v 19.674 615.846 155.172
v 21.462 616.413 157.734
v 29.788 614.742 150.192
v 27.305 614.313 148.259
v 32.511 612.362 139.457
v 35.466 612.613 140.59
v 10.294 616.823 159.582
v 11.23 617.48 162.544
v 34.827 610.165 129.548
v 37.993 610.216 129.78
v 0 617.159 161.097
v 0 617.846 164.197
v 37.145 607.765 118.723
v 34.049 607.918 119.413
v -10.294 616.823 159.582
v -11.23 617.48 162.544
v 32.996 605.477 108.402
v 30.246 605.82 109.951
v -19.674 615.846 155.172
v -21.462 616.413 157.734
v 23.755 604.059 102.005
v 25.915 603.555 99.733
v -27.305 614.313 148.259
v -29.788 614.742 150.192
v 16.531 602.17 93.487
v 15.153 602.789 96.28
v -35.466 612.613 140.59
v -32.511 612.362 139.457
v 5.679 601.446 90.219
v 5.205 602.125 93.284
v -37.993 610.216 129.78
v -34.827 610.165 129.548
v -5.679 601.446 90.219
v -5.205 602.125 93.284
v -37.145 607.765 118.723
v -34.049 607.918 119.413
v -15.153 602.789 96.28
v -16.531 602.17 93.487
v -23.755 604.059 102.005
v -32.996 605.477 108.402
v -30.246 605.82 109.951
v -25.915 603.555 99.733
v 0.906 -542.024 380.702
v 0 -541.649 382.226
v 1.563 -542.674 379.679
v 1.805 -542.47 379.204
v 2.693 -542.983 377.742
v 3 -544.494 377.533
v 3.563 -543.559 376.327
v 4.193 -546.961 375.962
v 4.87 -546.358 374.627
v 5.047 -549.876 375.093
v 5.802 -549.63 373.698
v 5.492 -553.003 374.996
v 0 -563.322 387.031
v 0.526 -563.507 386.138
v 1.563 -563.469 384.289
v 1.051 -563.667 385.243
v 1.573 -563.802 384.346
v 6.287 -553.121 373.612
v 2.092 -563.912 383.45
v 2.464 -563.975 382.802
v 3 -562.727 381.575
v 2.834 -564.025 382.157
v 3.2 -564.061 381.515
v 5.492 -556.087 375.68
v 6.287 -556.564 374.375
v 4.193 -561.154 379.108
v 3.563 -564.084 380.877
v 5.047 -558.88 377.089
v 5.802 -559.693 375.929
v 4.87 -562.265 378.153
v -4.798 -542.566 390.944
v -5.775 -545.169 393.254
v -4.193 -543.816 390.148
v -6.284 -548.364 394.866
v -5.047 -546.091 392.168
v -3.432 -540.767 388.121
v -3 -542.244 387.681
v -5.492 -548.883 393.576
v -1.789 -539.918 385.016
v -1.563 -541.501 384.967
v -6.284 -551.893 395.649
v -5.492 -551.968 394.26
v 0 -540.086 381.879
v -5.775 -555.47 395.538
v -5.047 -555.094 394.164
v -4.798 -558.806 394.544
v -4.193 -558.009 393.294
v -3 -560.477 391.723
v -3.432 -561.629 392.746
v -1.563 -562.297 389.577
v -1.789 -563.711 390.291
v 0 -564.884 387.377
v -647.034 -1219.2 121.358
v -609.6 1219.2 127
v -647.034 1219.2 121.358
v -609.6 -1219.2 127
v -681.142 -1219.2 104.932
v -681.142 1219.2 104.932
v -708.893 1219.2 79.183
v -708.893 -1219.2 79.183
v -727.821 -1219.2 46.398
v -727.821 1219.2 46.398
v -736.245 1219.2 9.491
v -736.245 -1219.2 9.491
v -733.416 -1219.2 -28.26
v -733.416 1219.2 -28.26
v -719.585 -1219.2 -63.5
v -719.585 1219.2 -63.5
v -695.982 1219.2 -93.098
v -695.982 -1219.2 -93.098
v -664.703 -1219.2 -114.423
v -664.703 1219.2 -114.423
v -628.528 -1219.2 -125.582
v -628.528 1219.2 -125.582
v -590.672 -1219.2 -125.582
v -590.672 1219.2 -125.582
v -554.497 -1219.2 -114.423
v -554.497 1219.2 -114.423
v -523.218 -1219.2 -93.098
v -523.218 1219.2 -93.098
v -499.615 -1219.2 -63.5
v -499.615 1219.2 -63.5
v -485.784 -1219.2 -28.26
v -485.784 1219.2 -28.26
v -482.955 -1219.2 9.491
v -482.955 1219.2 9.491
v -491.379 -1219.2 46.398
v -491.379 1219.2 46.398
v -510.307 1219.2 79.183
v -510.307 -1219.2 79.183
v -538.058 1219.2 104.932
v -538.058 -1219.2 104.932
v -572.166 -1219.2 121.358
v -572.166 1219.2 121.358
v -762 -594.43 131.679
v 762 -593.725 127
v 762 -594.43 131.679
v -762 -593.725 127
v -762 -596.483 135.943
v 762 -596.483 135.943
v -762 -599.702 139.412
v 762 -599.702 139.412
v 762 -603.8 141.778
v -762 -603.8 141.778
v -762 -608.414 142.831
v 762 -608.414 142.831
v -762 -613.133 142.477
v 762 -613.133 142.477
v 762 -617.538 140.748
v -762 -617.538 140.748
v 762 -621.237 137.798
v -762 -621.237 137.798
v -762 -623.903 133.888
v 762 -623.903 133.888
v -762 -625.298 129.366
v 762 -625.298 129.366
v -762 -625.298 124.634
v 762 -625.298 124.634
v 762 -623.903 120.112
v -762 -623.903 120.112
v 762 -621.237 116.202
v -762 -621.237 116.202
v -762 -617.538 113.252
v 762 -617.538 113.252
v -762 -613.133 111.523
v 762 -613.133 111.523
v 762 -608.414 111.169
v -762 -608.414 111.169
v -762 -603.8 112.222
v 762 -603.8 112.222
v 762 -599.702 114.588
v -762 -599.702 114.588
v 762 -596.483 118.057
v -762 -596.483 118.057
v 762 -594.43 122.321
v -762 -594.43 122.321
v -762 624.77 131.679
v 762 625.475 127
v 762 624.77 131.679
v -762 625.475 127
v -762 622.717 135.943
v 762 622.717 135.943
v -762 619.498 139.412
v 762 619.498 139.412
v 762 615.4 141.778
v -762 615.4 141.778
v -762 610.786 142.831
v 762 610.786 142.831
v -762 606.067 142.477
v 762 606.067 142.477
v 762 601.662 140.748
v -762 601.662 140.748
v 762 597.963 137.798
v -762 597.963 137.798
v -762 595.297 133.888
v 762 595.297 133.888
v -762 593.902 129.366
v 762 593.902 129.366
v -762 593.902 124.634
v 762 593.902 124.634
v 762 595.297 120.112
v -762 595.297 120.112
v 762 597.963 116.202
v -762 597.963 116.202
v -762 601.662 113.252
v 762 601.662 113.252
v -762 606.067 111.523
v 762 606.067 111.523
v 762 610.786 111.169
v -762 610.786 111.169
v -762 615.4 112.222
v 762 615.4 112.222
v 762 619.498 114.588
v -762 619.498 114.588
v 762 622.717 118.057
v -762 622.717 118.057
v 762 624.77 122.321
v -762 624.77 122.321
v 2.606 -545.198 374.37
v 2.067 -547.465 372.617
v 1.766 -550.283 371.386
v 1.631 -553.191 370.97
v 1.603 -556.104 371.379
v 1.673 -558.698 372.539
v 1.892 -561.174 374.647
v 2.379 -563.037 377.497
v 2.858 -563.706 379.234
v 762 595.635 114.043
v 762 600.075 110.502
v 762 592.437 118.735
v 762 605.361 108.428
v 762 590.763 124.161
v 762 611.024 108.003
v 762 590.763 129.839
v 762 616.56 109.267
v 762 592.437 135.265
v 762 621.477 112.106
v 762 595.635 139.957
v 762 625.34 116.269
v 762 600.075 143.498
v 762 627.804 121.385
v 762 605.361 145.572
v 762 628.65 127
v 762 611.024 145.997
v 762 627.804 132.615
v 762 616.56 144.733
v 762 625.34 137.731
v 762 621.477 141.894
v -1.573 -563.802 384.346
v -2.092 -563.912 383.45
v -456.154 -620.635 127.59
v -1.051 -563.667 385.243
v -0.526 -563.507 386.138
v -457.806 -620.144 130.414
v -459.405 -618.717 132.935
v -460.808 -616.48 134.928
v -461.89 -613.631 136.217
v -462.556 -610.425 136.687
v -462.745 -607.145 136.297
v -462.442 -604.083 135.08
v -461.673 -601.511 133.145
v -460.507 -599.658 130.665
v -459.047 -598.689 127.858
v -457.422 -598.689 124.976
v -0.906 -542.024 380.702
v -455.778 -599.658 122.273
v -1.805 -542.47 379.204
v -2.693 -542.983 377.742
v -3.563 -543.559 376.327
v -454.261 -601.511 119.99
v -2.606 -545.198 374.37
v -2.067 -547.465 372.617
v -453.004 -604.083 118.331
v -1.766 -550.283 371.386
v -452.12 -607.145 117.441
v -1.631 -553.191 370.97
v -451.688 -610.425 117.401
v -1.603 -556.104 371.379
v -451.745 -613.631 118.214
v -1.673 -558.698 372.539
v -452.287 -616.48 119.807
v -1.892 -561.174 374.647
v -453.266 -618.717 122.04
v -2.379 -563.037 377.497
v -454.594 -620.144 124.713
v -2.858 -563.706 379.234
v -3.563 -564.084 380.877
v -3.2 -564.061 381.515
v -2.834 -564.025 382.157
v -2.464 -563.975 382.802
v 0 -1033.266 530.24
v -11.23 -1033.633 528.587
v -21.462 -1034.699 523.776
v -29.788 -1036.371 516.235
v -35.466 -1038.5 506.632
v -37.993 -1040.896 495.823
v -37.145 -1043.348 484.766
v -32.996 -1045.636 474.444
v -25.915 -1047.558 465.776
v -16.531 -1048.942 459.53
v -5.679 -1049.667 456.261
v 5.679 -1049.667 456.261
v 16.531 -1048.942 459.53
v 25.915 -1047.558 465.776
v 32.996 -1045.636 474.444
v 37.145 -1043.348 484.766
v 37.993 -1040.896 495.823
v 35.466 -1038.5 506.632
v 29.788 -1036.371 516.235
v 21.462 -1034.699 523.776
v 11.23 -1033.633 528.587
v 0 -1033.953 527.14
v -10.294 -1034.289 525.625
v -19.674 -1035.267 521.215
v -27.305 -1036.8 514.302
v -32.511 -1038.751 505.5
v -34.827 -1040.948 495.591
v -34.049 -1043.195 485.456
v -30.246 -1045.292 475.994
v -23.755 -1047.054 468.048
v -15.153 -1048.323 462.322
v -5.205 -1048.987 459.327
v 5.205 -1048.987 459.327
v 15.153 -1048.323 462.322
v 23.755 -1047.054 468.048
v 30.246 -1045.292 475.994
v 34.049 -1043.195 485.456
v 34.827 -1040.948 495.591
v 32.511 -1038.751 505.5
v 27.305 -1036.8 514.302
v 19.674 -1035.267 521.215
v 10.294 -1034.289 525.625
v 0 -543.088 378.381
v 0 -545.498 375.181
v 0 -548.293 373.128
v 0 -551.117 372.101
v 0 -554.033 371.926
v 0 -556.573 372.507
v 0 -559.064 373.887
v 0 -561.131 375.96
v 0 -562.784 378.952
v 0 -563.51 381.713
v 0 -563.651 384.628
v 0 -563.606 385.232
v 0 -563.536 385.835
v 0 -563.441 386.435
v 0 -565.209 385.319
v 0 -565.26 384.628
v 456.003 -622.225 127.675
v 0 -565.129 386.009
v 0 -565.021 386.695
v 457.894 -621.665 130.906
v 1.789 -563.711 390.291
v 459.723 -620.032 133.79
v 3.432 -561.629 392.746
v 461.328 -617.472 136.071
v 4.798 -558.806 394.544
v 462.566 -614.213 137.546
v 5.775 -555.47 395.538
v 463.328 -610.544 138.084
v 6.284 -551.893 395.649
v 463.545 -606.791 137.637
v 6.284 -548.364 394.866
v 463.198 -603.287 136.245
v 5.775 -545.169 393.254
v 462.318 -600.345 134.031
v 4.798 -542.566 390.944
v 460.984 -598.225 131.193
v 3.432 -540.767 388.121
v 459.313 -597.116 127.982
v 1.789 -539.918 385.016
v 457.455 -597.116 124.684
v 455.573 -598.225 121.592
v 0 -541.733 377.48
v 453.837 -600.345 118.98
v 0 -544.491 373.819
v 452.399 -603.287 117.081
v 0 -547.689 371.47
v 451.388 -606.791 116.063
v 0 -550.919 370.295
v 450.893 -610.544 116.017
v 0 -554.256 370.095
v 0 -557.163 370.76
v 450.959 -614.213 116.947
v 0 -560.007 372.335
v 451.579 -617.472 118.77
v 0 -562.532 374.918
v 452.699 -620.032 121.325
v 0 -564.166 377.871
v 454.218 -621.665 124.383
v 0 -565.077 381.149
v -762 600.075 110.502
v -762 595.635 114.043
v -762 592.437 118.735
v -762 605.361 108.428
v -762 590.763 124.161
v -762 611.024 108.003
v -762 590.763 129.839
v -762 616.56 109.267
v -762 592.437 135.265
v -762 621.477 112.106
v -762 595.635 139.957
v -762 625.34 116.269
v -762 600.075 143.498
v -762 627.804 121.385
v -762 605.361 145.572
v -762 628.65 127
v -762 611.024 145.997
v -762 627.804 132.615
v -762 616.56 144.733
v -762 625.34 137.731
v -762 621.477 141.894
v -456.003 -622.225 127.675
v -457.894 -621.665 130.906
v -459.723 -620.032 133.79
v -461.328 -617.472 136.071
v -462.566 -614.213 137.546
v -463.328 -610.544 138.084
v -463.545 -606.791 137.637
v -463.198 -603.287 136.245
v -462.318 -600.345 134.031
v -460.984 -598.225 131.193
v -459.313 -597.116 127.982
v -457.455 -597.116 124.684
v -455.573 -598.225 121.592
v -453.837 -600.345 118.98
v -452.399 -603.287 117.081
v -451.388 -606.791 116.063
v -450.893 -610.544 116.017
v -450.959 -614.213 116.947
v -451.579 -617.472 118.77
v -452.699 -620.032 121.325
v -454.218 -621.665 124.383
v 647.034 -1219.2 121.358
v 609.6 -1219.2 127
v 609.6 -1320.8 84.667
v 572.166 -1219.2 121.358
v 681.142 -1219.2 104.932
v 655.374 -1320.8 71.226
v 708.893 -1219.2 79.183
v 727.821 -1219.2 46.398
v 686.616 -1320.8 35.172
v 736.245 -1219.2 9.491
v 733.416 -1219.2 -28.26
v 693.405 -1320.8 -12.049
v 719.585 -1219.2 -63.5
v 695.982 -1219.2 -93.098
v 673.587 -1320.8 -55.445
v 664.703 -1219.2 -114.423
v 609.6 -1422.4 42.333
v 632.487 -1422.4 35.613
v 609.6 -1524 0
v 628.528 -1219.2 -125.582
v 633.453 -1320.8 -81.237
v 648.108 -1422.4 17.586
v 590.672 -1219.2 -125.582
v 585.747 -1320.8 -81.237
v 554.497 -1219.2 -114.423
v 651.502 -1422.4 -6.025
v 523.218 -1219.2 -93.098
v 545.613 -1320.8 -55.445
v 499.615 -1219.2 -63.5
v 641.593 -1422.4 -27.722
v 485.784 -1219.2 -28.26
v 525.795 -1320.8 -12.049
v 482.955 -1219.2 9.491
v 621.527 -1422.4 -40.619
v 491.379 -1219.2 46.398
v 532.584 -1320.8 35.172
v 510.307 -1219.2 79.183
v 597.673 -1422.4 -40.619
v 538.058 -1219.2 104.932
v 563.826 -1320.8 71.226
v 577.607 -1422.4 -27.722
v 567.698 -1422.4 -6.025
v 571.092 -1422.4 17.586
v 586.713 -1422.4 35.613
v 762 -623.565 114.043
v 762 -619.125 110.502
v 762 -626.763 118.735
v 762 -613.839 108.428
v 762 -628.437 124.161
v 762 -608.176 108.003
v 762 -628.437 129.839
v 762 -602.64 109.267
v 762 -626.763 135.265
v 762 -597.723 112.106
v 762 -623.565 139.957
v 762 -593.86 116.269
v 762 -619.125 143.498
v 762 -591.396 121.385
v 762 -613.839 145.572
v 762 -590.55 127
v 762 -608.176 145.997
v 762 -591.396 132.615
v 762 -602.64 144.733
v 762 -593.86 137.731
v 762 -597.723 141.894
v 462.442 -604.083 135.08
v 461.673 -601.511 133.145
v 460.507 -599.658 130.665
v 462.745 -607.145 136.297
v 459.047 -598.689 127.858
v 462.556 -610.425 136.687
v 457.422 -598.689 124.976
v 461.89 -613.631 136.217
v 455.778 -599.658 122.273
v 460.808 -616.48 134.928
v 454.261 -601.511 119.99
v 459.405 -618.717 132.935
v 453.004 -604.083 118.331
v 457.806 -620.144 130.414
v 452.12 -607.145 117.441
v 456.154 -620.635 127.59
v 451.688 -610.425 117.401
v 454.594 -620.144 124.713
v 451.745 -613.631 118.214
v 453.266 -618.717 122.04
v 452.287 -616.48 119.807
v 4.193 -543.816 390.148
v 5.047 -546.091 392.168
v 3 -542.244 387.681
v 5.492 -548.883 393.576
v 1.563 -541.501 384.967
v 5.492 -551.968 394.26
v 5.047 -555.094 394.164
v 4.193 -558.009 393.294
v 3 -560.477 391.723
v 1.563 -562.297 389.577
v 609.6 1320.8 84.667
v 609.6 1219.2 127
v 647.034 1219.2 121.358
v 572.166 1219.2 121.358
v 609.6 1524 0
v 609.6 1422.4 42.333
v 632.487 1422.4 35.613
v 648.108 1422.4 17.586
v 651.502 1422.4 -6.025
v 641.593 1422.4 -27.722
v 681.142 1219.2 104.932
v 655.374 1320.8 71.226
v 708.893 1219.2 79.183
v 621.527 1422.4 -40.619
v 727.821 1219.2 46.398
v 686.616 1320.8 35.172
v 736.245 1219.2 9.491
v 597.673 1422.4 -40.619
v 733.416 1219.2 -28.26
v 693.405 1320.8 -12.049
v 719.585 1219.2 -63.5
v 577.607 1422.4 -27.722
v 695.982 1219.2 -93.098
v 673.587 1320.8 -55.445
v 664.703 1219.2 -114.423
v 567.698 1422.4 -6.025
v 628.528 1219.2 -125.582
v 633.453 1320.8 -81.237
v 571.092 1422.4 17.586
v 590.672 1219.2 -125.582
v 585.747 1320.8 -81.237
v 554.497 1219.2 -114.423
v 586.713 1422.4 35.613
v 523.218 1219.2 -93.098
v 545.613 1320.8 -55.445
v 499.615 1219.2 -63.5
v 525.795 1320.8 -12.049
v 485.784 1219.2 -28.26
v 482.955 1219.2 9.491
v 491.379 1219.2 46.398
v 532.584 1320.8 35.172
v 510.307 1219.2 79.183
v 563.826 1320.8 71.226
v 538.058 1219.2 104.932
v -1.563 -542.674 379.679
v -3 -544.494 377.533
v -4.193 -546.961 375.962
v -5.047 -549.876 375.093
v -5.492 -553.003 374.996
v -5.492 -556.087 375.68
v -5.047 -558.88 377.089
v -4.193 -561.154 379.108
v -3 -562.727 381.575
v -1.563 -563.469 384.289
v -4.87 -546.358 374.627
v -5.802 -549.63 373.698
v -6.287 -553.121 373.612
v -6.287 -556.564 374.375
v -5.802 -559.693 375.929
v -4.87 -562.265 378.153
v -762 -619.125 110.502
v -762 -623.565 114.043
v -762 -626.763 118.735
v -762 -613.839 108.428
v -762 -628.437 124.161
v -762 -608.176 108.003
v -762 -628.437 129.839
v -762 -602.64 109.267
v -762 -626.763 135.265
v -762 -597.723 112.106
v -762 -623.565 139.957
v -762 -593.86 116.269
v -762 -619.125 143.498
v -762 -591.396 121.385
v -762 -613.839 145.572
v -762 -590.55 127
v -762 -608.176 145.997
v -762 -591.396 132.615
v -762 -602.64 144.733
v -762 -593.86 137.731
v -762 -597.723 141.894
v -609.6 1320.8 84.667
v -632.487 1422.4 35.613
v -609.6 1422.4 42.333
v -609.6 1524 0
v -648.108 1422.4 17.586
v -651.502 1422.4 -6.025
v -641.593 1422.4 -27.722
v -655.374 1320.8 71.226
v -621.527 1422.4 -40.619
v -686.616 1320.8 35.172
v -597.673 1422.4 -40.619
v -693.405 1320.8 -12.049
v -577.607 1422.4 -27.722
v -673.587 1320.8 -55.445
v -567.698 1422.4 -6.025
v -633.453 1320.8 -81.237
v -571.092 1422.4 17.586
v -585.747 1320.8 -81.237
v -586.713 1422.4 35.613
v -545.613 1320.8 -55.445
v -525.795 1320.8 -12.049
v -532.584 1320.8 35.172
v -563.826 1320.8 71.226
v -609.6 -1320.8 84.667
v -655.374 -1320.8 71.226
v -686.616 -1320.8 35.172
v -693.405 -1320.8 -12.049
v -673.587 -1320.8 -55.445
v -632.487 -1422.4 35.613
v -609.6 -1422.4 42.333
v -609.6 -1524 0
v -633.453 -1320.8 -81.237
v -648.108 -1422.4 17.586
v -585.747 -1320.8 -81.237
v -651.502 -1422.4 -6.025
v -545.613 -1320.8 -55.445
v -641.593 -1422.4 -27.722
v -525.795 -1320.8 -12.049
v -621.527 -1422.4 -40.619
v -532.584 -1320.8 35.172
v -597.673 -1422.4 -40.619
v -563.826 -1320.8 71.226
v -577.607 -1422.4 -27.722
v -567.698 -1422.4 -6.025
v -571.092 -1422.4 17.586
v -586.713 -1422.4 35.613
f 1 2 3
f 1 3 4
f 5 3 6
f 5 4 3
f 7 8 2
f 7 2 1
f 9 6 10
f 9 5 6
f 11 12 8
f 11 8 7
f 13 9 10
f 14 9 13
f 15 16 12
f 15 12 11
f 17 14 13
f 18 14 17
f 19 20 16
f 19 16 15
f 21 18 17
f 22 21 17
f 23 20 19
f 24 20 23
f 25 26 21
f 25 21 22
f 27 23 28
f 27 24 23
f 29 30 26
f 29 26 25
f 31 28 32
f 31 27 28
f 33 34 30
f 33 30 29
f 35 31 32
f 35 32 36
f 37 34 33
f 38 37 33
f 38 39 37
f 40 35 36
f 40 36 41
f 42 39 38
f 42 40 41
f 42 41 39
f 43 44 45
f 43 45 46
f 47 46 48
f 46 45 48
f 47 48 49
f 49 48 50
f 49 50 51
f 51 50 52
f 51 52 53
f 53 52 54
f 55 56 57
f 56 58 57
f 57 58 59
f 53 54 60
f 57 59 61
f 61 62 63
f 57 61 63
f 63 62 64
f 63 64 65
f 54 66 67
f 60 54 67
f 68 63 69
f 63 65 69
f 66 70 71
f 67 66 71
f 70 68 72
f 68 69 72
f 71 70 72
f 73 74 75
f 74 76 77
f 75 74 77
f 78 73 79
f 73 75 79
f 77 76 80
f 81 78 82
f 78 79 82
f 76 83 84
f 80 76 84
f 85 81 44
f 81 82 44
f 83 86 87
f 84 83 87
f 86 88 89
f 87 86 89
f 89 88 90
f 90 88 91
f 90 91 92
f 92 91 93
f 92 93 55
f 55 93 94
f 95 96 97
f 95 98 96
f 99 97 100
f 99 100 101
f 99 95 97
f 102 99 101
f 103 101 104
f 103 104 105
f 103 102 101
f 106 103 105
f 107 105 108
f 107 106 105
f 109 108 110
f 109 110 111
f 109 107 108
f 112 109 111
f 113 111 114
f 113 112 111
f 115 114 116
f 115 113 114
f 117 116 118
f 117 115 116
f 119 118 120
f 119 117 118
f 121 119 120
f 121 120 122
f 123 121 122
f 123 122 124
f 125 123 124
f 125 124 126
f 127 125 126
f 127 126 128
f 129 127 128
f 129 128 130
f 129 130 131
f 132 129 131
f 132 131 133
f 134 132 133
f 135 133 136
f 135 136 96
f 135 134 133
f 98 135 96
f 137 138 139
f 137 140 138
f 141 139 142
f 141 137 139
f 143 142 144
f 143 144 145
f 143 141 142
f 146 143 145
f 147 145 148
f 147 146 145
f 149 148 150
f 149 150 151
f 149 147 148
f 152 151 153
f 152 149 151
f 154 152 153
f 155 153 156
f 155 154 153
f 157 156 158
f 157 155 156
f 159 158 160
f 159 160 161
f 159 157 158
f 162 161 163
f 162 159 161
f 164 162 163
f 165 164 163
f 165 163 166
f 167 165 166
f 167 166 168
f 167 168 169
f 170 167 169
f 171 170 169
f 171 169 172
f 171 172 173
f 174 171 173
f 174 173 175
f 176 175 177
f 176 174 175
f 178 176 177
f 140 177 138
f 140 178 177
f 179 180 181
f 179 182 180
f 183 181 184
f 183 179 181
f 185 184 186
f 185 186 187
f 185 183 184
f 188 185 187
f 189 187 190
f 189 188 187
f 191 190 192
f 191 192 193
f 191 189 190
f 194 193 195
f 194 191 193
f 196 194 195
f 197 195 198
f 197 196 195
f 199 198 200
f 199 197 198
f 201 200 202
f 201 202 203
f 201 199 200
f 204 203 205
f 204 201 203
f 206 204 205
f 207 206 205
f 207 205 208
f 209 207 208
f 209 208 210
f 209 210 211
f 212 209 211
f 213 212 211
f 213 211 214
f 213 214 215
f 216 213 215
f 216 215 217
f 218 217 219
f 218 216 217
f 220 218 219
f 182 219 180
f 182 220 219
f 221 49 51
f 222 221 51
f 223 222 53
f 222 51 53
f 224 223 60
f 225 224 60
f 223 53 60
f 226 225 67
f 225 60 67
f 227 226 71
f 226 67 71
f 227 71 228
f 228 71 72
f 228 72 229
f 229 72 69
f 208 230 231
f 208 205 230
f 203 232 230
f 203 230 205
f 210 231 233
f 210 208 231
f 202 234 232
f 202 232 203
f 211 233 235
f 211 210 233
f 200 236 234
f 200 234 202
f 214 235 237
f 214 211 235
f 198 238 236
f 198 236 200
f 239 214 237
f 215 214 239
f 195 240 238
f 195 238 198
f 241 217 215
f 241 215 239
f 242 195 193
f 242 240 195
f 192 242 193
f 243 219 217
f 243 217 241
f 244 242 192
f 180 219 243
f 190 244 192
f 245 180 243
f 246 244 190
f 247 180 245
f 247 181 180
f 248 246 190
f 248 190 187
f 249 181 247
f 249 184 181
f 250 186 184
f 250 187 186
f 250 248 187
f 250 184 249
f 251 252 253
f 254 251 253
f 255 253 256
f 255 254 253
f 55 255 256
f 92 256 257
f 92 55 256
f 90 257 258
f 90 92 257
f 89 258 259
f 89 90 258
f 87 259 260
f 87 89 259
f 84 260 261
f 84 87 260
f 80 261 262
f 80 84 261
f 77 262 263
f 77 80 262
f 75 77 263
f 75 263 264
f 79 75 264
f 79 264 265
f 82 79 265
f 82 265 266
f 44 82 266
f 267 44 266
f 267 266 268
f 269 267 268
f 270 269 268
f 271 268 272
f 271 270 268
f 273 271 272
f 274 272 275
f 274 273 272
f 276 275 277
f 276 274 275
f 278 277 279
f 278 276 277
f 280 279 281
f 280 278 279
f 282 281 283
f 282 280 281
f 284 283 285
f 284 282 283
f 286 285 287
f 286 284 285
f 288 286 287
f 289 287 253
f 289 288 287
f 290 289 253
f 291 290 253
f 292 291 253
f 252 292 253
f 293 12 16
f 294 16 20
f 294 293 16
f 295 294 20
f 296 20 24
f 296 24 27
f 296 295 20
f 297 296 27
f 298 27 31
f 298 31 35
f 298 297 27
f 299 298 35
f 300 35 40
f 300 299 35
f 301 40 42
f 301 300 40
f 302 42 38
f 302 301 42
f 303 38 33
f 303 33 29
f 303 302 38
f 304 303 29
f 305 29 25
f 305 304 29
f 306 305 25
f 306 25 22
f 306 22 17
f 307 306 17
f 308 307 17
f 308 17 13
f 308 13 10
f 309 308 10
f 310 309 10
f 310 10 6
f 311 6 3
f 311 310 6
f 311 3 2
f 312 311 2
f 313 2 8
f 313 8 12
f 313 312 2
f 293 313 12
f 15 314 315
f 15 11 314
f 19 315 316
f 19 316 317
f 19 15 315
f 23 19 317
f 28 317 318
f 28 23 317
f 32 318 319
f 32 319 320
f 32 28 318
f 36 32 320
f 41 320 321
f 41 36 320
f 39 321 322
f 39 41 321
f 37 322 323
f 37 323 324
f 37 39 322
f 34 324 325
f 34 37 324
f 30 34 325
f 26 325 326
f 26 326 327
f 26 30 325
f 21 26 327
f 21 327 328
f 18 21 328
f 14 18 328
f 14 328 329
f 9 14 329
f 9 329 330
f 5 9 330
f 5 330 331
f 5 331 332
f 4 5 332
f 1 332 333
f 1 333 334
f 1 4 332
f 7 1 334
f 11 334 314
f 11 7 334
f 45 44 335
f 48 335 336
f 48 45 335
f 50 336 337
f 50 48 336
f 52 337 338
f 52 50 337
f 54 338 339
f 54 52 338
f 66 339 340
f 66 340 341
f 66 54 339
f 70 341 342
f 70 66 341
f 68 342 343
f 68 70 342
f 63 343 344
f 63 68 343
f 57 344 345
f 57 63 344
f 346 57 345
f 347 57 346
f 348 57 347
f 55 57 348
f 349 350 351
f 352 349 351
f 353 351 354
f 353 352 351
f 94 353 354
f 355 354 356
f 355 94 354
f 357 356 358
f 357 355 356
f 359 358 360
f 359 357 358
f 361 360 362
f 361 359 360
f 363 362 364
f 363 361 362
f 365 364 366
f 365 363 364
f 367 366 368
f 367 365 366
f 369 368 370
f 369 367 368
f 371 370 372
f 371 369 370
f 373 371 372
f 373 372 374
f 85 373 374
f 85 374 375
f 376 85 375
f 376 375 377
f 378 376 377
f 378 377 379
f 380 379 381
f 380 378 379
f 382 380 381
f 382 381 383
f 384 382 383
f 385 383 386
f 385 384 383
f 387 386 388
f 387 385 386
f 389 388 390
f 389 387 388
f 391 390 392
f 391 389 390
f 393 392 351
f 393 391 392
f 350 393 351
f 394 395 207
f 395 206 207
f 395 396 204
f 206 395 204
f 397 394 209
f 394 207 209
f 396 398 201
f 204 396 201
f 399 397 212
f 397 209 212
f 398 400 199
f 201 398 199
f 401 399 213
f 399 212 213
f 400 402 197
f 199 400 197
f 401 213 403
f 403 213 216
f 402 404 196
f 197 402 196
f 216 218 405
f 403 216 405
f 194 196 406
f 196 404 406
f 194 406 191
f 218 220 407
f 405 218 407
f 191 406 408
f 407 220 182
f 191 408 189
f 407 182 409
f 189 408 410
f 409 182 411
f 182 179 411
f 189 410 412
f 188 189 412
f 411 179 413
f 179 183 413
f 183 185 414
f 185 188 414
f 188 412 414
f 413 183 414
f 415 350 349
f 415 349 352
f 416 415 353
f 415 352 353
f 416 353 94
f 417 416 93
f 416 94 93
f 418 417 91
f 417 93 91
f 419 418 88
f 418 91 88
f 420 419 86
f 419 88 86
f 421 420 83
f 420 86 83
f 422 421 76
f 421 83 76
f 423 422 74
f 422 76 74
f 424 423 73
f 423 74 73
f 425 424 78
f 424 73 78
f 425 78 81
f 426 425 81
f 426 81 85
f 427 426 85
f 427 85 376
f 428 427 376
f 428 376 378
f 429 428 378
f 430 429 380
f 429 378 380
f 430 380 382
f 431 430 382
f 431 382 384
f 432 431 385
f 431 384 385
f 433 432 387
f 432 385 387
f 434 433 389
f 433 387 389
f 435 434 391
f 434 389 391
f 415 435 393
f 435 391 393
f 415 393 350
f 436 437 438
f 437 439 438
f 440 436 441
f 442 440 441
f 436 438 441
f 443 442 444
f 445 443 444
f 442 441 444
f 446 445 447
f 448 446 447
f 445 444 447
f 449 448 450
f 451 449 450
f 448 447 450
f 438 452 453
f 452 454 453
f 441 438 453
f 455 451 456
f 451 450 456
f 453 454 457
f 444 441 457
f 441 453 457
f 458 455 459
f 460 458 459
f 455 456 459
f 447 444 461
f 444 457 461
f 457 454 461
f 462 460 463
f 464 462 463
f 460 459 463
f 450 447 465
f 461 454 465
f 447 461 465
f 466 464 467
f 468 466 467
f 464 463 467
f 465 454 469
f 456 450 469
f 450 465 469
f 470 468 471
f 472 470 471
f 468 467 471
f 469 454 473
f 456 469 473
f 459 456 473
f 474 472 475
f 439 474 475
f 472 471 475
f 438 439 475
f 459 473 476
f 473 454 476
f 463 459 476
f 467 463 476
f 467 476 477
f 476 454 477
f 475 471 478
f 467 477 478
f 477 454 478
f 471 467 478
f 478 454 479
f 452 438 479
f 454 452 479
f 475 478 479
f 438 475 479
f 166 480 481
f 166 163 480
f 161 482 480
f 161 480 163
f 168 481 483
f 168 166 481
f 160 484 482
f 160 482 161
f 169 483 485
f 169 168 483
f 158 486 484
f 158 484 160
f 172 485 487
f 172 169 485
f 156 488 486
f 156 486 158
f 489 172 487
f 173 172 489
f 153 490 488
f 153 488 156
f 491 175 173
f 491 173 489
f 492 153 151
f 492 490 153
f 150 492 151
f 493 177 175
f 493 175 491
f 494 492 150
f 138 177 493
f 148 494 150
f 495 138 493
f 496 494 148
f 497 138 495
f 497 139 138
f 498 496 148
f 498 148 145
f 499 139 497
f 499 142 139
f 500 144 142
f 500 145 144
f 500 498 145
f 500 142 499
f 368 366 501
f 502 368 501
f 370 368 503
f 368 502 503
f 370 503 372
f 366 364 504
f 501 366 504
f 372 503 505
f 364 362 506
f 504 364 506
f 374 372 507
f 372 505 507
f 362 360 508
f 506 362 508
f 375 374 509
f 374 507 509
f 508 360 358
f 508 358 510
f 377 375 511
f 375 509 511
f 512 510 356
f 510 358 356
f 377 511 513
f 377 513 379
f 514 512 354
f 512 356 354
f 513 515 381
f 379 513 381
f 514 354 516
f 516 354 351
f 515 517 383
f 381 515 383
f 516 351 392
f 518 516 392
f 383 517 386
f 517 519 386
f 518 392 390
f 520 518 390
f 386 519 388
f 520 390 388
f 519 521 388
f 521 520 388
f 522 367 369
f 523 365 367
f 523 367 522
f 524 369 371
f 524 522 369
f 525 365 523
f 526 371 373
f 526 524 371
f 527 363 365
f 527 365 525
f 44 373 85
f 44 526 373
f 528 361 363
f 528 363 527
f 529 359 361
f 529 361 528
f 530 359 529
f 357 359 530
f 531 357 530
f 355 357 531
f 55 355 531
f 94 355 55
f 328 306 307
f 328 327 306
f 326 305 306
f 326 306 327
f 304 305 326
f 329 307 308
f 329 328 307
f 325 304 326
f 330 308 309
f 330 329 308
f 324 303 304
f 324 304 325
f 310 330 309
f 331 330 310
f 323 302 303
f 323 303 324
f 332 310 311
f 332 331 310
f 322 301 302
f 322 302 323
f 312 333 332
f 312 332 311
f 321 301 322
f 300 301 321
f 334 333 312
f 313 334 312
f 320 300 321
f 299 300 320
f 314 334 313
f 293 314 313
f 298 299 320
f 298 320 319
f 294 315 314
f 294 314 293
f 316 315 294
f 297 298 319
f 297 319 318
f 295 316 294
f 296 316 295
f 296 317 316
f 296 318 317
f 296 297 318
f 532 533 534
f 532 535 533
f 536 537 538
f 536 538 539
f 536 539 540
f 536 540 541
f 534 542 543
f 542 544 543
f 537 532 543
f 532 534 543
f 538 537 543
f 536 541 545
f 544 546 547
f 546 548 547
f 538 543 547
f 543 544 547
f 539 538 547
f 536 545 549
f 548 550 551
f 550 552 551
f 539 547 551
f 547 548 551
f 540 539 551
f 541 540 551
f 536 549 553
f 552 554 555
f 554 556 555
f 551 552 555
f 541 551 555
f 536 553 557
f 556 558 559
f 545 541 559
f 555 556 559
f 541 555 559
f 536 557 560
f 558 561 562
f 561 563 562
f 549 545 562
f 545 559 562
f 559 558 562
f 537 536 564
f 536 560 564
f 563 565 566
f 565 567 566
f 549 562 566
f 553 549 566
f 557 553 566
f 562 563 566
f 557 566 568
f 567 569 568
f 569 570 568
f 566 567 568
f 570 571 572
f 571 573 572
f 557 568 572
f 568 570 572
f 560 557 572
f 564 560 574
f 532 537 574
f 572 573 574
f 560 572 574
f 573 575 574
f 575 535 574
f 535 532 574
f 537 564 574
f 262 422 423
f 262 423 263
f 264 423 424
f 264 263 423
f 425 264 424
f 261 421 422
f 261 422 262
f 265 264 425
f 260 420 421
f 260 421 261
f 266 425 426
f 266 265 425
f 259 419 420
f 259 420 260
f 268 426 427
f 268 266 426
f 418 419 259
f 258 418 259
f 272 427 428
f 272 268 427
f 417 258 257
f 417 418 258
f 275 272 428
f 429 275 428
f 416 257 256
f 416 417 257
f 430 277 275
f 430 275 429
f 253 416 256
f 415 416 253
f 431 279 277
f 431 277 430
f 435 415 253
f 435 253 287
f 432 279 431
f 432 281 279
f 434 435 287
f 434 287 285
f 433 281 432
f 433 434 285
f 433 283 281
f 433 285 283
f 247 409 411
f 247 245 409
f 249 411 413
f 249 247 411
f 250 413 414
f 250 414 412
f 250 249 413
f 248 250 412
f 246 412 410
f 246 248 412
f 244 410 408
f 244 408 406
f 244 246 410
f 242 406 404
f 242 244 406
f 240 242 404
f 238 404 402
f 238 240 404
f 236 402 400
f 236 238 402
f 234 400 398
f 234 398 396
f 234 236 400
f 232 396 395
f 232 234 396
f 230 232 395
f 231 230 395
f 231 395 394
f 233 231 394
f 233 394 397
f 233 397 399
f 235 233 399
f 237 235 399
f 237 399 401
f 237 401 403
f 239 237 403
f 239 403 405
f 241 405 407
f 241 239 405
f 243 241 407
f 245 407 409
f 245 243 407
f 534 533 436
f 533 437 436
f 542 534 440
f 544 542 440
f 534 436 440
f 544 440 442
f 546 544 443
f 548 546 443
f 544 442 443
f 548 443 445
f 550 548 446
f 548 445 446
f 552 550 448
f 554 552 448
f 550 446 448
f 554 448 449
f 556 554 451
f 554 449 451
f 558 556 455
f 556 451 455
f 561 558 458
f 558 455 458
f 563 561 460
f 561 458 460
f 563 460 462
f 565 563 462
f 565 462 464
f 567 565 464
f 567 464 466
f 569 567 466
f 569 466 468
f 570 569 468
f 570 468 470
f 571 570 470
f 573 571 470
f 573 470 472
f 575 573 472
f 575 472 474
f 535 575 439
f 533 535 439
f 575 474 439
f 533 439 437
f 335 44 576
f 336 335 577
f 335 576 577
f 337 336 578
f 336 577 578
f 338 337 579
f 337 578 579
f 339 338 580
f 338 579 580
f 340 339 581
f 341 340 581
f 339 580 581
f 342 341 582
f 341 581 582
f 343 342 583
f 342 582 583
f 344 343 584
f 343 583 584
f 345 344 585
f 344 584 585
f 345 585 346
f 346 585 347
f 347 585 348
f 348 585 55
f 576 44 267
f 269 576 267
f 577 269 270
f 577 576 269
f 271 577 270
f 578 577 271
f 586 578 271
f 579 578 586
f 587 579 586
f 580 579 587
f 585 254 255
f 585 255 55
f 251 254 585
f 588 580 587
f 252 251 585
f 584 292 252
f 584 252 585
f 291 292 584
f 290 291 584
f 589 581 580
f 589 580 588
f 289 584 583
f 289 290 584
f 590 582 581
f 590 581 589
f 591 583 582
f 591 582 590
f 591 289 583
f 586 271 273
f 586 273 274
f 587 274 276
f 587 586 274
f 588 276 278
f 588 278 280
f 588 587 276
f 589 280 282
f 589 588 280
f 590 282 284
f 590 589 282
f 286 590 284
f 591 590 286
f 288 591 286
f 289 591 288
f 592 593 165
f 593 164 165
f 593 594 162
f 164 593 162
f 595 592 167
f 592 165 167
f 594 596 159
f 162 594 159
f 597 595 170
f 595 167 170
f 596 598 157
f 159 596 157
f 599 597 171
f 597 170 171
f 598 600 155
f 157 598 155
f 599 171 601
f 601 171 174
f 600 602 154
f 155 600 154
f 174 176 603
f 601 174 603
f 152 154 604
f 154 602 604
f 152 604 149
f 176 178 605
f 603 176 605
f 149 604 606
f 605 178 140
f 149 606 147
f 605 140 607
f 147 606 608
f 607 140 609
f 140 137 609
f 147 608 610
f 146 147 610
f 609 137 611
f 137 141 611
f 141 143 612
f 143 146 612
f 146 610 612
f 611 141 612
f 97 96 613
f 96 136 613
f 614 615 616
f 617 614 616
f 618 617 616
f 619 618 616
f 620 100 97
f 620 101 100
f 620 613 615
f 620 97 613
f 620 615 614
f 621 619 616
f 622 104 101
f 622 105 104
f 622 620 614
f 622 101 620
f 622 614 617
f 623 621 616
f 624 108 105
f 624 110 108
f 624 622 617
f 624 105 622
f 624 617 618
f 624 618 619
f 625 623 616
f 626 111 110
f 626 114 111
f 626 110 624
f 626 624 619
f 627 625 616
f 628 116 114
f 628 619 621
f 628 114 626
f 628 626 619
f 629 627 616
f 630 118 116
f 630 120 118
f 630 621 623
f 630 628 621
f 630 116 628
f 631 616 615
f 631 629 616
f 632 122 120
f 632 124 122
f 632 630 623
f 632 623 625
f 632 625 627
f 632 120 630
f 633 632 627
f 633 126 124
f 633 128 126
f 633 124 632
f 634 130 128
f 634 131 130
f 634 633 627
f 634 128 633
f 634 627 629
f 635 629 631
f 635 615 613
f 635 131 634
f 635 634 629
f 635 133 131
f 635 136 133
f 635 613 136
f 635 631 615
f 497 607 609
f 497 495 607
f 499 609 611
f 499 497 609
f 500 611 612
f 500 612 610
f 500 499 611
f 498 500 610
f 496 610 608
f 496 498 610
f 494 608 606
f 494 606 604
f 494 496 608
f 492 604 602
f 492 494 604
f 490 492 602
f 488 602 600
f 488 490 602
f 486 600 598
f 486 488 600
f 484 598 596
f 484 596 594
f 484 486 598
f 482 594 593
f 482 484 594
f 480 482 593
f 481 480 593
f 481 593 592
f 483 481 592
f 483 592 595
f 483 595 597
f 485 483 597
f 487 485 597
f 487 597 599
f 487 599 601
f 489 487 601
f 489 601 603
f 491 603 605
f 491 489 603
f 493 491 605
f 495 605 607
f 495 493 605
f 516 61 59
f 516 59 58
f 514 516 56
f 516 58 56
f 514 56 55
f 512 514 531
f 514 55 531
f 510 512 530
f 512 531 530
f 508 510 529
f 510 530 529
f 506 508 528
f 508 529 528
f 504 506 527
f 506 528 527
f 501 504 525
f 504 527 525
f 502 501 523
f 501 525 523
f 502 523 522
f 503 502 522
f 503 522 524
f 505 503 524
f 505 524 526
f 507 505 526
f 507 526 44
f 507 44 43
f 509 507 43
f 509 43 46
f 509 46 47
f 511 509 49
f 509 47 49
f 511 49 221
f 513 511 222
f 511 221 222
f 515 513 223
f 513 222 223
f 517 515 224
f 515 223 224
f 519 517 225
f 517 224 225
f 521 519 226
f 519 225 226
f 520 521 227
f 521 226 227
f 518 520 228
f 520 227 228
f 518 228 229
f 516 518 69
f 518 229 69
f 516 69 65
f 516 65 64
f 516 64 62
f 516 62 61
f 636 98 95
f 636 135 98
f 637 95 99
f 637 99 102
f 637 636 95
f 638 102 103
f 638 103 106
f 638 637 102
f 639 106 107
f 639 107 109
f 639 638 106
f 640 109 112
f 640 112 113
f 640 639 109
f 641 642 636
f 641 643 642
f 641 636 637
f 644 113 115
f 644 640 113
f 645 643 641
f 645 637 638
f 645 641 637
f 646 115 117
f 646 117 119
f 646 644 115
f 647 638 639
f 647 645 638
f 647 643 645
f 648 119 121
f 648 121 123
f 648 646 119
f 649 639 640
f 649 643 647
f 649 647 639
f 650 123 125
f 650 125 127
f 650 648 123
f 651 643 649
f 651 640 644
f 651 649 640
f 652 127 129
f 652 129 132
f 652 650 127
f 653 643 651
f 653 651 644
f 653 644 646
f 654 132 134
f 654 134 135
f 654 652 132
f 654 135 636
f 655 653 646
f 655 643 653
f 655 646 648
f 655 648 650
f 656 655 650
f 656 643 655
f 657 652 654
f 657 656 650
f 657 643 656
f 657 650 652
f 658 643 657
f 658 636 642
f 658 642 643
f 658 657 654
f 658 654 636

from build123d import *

# Parameters (mm, degrees)
F7_R     = 19.05
F7_R_2   = 15.875
F8_DEPTH = 762
F12_R    = 12.7
F12_R_2  = 11.0998


with BuildPart() as f3:
    # F2 (on offset) → F3 (revolve)
    with BuildSketch(Plane.YZ.offset(609.6)):
        Polygon((1219.2, 127), (-1219.2, 127), (-1524, 0), (1524, 0), align=None)
    revolve(axis=Axis((609.6, 0, 0), (0, 1, 0)))


with BuildPart() as f4_1:
    # F4: instance of F3
    add(f3.part.mirror(Plane.YZ))


with BuildPart() as f6:
    # F5 (on Right) → F6 (revolve)
    with BuildSketch(Plane.YZ):
        Polygon((-1033.2662311045, 530.2397243676), (-1033.9534268788, 527.139984545), (617.1591535168, 161.0971380487), (617.846349291, 164.1968778713), align=None)
    revolve(axis=Axis((0, -215.9562901978, 310.0214232482), (0, -0.9762960071, 0.2164396139)))


with BuildPart() as f8:
    # F7 (on Right) → F8 (new body, symmetric)
    with BuildSketch(Plane.YZ):
        with Locations((-609.6, 127)):
            Circle(F7_R)
        with Locations((-609.6, 127)):
            Circle(F7_R_2, mode=Mode.SUBTRACT)
    extrude(amount=F8_DEPTH, both=True)


with BuildPart() as f8b:
    # F7 (on Right) → F8, piece 2 (new body, symmetric)
    with BuildSketch(Plane.YZ):
        with Locations((609.6, 127)):
            Circle(F7_R)
        with Locations((609.6, 127)):
            Circle(F7_R_2, mode=Mode.SUBTRACT)
    extrude(amount=F8_DEPTH, both=True)


with BuildPart() as f13:
    # F13: sweep along a path in F10
    with BuildLine(Plane(origin=(0, -607.8788731093, 134.7635017017), x_dir=(1, 0, 0), z_dir=(0, -0.9762960071, 0.2164396139))) as f13_path:
        Line((457.2, -7.9519957524), (0, 255.9311815609))
    # F12 (on line) → F13 (sweep)
    with BuildSketch(Plane(origin=(346.3956329204, -43.2727645455, -195.1908270125), x_dir=(-0.0942599861, -0.9941297141, 0.0531146553), z_dir=(-0.8660921382, 0.1081947854, 0.4880351386))):
        with Locations((569.6713692747, 335.0904436434)):
            Circle(F12_R)
        with Locations((569.6713692747, 335.0904436434)):
            Circle(F12_R_2, mode=Mode.SUBTRACT)
    sweep(path=f13_path.line)

    # F14: F13 across plane


with BuildPart() as f13_1:
    add(f13.part)
    add(f13.part.mirror(Plane.YZ))


solid = Compound([f3.part, f4_1.part, f6.part, f8.part, f8b.part, f13_1.part])
